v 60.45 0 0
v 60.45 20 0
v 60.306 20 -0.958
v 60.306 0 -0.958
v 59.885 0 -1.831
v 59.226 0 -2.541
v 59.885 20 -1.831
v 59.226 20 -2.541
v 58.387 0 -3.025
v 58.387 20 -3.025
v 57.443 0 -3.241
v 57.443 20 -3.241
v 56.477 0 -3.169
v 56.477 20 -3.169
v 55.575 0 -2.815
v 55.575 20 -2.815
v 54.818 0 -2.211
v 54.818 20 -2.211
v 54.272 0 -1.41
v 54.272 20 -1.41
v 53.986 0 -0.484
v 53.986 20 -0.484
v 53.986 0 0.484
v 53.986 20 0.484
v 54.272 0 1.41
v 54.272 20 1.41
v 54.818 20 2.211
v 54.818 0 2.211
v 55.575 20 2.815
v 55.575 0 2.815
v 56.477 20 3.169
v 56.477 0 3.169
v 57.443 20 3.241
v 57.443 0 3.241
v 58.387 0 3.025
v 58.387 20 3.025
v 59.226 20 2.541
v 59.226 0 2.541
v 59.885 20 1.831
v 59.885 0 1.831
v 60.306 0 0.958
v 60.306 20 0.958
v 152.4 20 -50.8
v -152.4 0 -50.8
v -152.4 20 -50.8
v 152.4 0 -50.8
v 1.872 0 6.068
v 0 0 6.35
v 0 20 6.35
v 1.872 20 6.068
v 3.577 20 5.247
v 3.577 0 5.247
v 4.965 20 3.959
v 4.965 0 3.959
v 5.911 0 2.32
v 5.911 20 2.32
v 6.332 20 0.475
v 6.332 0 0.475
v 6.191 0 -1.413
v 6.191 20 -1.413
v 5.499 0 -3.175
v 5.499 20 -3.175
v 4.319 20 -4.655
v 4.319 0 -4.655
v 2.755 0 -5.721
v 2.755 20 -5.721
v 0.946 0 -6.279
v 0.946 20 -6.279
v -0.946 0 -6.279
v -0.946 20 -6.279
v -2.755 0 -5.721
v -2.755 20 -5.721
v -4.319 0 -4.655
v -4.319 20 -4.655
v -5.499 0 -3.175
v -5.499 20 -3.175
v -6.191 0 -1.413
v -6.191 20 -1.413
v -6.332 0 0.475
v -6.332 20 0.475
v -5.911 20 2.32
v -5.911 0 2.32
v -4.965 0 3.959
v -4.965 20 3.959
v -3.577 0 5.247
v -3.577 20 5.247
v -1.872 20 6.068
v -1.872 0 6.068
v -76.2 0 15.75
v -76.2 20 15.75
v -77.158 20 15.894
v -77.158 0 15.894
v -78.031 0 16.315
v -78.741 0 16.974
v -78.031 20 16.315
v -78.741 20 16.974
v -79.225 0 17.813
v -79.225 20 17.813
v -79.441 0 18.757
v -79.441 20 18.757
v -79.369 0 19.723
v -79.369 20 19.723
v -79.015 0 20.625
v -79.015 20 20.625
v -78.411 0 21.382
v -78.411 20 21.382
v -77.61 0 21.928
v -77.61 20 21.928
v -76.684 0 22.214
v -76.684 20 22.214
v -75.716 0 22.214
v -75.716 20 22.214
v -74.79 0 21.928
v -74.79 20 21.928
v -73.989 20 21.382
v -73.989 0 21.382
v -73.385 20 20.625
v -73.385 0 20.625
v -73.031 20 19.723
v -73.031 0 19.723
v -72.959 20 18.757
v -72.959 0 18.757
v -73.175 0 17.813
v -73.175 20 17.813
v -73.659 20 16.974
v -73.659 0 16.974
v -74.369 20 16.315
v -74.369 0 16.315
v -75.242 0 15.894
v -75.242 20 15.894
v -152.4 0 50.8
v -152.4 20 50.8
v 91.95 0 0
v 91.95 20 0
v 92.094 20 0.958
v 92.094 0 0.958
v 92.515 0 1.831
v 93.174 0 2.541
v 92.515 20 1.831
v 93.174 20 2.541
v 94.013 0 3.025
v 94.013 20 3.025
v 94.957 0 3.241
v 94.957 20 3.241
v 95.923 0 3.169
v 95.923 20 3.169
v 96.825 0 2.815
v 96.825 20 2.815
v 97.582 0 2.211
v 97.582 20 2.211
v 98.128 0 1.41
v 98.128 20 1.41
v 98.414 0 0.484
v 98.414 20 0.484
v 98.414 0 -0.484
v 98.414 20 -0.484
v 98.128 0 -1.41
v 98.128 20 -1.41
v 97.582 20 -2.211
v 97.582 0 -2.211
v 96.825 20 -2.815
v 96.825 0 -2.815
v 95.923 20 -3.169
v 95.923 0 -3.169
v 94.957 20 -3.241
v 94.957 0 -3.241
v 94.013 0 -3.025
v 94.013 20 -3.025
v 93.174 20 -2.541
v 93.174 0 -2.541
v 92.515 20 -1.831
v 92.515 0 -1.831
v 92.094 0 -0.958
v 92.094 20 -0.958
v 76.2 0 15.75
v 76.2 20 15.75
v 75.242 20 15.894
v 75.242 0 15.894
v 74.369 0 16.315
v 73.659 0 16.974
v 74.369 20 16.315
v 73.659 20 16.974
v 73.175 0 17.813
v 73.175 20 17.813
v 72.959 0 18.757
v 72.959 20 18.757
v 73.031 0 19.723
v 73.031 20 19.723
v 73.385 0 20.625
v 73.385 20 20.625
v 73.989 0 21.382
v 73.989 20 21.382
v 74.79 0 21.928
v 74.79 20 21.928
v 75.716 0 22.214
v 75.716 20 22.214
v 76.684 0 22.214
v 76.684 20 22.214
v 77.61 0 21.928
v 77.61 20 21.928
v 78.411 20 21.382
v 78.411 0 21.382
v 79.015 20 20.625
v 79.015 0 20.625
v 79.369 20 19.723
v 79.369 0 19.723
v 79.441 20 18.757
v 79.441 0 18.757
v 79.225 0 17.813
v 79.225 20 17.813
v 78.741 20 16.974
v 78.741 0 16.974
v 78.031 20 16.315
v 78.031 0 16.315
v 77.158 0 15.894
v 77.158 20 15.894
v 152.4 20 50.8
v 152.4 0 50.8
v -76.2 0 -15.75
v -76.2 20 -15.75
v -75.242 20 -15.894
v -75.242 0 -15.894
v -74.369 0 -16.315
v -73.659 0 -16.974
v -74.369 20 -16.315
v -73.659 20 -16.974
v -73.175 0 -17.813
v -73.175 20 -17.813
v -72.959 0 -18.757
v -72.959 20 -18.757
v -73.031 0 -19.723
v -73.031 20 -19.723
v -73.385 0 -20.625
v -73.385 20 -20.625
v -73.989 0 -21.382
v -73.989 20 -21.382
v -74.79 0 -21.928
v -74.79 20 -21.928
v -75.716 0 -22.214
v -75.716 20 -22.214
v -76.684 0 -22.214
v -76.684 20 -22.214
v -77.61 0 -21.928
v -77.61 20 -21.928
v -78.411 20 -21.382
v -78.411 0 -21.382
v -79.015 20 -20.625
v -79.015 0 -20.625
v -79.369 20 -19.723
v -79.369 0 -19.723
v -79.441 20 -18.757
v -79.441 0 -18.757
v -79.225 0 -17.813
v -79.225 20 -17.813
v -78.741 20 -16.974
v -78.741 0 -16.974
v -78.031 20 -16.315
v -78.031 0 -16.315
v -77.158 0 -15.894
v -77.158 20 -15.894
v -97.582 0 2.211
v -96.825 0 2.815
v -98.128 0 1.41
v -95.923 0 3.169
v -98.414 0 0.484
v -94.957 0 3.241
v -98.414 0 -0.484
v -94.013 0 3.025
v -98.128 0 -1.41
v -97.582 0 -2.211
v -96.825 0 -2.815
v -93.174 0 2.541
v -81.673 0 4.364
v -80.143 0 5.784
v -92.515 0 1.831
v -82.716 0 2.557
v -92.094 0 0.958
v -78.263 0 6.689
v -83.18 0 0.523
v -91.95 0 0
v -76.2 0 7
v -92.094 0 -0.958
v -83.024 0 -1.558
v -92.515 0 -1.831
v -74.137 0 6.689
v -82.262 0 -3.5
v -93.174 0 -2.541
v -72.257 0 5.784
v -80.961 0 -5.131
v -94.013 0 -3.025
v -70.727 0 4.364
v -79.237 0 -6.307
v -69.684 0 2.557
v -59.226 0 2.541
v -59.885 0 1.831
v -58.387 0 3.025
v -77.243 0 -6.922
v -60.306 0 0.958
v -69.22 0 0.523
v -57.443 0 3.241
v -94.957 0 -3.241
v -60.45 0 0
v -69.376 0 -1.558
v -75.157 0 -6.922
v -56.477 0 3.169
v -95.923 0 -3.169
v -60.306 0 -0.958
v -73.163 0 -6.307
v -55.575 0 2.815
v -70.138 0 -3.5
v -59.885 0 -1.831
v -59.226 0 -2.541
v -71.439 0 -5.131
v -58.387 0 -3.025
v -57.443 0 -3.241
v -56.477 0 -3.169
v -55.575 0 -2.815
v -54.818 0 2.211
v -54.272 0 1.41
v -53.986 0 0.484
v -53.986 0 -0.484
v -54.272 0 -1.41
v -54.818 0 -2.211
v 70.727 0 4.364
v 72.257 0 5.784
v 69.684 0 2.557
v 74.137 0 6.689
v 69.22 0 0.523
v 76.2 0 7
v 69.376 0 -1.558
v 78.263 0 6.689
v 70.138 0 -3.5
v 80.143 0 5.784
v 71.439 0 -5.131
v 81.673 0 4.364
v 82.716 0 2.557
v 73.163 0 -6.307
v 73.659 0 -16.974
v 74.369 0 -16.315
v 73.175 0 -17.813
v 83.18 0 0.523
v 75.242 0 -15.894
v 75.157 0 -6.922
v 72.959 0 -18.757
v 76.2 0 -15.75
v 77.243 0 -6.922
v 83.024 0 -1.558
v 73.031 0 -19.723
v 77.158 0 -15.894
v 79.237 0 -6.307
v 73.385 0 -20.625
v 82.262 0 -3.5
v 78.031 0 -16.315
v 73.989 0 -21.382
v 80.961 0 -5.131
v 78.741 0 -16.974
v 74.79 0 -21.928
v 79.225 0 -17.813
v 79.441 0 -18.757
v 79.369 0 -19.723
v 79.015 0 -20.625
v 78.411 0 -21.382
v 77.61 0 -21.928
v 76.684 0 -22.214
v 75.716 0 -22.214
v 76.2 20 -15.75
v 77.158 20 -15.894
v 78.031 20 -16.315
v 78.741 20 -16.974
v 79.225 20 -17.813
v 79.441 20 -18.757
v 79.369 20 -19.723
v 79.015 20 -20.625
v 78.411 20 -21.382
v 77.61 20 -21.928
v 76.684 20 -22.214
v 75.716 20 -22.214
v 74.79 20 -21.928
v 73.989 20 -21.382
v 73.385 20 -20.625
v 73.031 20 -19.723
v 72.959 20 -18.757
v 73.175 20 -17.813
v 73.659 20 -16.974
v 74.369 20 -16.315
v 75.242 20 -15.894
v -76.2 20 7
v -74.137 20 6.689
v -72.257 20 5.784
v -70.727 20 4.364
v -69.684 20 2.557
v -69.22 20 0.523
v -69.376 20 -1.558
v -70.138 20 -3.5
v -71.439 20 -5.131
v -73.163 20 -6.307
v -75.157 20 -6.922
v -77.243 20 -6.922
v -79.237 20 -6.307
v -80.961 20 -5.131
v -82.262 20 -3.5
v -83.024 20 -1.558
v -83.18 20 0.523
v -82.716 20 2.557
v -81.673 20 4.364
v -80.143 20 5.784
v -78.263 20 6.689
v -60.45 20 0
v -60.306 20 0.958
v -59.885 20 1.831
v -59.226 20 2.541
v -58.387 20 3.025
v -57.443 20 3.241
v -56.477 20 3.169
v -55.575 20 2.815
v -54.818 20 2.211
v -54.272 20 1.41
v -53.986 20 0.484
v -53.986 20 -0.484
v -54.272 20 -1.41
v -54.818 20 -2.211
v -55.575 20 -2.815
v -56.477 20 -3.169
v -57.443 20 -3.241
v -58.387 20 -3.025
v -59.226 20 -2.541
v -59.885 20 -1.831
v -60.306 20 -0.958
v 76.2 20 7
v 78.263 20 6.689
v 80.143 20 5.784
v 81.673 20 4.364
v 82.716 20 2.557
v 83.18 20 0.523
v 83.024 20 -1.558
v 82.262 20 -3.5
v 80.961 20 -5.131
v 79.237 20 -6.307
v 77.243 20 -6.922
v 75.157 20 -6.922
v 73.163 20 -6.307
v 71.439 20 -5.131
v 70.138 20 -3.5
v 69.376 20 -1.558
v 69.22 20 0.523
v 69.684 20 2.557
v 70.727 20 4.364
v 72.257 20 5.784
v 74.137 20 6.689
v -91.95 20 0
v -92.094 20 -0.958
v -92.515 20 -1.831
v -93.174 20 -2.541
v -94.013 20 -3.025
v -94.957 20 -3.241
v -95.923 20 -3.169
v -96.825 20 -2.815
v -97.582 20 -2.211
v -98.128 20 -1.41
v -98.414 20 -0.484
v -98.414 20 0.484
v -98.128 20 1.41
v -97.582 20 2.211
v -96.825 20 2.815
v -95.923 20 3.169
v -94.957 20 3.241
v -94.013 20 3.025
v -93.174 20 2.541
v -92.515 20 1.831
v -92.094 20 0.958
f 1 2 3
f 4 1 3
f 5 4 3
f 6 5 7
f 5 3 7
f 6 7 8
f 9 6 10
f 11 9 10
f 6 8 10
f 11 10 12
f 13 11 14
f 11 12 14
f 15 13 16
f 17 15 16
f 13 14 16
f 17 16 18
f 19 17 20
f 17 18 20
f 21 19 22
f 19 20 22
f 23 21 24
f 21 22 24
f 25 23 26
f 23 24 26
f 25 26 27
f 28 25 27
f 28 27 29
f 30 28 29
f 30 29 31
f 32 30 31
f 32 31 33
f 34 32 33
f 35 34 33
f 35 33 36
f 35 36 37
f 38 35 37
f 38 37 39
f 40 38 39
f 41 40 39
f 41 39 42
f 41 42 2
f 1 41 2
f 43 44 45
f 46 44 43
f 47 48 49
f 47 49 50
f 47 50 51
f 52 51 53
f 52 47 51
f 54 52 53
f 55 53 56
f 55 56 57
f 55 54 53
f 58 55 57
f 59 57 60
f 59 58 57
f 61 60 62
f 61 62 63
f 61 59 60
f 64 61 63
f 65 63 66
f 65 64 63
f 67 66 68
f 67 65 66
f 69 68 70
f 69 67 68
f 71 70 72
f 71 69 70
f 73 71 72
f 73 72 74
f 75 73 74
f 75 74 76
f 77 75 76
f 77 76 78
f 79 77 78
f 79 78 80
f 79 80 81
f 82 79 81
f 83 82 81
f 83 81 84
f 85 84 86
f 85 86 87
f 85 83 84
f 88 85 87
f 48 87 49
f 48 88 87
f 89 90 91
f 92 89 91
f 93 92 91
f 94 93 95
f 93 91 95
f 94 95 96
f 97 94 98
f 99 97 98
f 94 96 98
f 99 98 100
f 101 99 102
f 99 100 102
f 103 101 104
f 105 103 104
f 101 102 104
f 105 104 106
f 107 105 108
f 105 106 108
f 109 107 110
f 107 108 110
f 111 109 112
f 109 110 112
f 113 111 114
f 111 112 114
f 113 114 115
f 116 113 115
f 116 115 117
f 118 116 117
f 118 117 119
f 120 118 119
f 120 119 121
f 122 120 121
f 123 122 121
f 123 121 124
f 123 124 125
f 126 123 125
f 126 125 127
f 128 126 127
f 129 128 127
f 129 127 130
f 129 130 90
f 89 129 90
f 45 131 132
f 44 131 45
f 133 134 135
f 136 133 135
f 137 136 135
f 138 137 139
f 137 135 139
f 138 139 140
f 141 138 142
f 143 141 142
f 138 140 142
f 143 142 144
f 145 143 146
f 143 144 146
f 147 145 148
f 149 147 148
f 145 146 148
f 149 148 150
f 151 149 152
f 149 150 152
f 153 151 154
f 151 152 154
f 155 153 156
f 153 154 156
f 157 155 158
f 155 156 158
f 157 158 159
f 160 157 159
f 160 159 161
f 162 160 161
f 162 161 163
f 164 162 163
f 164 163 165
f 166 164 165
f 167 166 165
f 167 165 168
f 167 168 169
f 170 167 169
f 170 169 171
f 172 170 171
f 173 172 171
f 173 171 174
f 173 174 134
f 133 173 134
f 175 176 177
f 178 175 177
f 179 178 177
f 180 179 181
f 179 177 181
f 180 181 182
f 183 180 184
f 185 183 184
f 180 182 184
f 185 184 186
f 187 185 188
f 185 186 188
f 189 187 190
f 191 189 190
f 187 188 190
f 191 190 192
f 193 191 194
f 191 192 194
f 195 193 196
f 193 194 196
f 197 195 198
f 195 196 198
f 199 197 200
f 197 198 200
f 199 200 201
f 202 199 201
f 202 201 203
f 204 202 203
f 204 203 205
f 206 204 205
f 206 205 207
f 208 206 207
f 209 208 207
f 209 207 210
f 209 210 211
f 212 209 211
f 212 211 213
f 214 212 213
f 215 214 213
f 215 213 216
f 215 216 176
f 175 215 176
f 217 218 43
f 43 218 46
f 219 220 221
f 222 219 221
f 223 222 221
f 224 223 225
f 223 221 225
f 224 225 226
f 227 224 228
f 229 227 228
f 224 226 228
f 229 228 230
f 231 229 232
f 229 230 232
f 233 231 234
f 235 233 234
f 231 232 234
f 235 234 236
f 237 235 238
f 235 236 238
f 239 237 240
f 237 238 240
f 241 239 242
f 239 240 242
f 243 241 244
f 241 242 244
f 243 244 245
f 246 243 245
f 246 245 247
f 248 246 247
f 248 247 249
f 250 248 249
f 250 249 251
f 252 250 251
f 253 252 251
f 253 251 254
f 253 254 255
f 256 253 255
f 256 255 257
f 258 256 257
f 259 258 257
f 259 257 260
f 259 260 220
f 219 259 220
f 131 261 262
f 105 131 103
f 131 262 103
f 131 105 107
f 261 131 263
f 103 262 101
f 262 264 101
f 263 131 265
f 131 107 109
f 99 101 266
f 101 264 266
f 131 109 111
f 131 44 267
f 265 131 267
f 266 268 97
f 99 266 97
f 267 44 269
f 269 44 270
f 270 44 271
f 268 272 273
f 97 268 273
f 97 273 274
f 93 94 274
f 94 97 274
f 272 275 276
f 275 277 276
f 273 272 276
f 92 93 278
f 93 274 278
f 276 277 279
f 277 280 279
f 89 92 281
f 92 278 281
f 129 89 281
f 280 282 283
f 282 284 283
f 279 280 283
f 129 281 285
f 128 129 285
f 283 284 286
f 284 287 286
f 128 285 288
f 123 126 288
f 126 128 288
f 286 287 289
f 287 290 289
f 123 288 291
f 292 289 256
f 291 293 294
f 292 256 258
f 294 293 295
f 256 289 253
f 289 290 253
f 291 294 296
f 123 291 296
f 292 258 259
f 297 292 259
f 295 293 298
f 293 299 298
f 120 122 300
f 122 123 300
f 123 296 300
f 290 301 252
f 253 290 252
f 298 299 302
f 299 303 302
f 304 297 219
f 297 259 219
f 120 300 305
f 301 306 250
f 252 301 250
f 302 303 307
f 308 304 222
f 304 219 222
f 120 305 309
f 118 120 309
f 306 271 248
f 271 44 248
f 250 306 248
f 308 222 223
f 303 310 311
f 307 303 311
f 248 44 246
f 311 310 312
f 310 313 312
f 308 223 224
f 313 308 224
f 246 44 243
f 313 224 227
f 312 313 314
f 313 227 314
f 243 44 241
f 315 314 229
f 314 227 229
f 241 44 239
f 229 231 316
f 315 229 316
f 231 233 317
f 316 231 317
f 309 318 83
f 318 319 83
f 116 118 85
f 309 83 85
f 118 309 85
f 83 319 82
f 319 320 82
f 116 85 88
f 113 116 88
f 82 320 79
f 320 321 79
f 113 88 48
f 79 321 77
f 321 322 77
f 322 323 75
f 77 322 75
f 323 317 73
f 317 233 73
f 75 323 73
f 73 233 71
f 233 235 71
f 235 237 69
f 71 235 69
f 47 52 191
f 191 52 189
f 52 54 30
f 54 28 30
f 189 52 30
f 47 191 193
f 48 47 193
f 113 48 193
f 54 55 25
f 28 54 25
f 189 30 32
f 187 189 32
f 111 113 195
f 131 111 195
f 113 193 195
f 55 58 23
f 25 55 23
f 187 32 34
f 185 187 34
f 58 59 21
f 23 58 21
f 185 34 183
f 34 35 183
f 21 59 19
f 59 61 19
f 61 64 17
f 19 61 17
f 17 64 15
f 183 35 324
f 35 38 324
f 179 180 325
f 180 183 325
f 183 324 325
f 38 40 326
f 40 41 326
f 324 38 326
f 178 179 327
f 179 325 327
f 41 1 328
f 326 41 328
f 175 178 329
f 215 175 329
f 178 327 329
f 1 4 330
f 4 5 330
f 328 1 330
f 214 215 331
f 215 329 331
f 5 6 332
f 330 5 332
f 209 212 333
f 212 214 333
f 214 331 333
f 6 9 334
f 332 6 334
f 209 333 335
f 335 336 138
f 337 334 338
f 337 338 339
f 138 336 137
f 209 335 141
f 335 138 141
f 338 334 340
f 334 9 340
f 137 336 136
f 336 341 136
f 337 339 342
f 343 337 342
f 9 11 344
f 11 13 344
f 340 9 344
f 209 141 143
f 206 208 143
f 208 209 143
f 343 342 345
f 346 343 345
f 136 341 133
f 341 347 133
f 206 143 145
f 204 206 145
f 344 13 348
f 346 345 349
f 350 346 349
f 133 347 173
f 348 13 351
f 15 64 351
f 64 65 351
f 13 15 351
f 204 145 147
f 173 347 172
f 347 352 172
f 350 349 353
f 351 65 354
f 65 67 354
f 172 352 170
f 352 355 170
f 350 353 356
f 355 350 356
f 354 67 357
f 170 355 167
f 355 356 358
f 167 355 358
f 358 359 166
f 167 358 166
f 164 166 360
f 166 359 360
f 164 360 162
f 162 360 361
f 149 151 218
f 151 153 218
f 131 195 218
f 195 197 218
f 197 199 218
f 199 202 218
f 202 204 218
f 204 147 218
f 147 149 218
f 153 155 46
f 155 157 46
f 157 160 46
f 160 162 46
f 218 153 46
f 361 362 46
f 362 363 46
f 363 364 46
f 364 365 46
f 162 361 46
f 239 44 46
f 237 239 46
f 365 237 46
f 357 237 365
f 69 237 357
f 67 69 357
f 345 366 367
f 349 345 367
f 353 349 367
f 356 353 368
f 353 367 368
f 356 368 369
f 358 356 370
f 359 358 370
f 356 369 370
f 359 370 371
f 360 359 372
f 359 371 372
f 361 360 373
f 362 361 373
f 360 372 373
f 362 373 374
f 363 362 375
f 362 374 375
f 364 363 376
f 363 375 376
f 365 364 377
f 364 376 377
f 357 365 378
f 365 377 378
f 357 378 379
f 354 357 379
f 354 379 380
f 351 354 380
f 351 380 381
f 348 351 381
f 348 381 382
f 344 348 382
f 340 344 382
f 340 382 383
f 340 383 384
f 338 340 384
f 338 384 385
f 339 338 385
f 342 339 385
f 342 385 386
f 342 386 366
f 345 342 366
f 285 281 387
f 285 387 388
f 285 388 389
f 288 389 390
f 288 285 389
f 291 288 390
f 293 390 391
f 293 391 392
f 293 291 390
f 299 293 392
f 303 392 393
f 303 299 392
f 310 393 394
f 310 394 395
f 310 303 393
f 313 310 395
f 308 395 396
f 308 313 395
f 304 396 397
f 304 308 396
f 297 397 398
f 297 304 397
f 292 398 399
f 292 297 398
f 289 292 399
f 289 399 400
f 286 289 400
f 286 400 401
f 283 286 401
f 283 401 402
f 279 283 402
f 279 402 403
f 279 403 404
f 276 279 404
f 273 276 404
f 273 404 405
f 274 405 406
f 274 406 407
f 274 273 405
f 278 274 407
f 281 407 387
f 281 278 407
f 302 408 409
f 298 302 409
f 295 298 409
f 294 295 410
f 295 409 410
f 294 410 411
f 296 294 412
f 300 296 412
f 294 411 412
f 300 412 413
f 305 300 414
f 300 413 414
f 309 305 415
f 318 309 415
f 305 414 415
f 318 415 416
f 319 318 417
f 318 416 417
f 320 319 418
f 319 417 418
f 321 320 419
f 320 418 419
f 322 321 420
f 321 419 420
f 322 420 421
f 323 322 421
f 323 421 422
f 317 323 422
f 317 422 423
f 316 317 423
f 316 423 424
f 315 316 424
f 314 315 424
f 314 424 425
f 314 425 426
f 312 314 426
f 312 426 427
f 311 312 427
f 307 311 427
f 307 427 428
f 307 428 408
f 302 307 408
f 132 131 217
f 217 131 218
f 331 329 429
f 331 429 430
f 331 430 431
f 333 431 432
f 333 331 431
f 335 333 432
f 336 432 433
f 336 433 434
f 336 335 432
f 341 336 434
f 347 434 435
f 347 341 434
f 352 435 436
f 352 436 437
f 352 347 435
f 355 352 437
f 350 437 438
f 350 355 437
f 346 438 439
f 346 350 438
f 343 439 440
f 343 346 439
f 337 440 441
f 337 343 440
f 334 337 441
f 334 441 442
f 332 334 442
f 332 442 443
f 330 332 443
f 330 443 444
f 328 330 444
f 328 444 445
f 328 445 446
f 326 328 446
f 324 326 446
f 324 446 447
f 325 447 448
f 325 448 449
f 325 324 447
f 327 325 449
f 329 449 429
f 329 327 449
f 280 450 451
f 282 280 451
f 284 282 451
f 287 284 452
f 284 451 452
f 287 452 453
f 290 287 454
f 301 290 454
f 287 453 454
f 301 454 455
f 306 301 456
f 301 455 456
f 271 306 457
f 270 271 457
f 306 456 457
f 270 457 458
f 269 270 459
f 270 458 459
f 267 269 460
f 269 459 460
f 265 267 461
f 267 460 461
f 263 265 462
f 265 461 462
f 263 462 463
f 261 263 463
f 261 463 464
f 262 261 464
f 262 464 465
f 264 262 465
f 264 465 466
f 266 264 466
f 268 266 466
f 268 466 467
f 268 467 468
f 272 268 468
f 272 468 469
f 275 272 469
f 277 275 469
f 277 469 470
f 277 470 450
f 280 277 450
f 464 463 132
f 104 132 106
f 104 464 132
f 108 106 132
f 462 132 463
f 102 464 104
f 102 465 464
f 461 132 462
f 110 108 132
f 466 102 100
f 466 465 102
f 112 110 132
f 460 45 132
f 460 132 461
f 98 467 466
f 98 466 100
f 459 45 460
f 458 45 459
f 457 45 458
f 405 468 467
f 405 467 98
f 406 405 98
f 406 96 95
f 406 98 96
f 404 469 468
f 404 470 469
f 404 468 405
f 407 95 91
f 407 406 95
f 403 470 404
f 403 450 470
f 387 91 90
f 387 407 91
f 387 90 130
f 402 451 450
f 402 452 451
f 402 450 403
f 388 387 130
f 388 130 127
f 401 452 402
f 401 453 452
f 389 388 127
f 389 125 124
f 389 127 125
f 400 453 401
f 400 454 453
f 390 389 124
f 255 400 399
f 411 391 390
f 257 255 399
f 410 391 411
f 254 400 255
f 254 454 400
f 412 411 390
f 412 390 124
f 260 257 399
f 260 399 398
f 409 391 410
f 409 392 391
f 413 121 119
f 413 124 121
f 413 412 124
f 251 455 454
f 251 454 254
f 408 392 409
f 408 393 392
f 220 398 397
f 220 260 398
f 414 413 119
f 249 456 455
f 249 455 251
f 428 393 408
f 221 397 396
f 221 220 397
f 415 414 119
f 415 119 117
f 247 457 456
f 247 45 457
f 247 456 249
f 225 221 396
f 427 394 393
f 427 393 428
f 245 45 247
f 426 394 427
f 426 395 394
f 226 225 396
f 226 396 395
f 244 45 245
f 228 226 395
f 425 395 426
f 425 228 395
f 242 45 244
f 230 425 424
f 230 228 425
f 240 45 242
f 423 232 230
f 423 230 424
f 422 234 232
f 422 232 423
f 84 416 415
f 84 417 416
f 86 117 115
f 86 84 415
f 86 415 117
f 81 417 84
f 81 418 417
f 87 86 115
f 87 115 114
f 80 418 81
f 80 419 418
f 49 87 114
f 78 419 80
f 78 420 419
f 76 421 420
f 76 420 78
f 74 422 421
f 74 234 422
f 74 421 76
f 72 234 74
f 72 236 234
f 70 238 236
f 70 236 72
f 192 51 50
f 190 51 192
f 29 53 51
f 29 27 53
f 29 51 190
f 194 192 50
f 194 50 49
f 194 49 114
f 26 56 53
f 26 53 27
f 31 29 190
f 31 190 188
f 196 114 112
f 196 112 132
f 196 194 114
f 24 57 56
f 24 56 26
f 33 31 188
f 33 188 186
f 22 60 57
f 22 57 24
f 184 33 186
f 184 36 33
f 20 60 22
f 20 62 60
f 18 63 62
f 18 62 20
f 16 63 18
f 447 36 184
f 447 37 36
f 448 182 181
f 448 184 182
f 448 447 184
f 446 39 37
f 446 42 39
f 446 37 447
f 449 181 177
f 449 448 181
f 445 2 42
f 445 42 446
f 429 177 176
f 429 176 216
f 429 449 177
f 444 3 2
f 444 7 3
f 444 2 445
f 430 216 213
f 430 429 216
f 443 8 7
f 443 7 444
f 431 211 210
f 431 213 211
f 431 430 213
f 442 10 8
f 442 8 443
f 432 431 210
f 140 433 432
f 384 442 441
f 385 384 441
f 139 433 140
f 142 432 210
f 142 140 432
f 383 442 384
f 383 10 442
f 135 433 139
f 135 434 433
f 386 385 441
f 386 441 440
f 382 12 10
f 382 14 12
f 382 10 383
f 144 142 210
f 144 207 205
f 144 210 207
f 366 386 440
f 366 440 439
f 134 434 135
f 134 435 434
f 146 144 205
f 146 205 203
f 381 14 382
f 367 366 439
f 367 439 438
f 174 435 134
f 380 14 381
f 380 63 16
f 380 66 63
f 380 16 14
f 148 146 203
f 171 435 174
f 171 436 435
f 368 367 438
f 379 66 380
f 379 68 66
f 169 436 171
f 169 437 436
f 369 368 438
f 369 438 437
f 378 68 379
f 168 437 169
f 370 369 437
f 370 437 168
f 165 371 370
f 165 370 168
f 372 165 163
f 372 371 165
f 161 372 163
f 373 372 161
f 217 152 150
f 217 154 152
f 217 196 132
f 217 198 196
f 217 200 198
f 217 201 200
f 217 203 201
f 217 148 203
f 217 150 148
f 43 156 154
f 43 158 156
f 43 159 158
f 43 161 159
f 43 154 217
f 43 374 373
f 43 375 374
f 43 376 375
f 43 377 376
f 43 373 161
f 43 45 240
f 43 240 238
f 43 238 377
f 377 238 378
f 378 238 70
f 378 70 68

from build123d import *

# Parameters (mm, degrees)
SKETCH2_W                 = 304.8
SKETCH2_H                 = 101.6
SKETCH2_R                 = 6.35
SKETCH2_R_2               = 7
BOSS_EXTRUDE1_DEPTH       = 20
SKETCH3_R                 = 3.25
CUT_EXTRUDE1_DEPTH        = 162.883909021
CIRPATTERN1_COUNT         = 4
LPATTERN1_COUNT           = 2
LPATTERN1_PITCH           = 152.4
LPATTERN1_COPY_1_SKETCH_R = 3.25
LPATTERN1_COPY_1_DEPTH    = 162.883909021
LPATTERN1_COPY_2_SKETCH_R = 3.25
LPATTERN1_COPY_2_DEPTH    = 162.883909021
LPATTERN1_COPY_3_SKETCH_R = 3.25
LPATTERN1_COPY_3_DEPTH    = 162.883909021


with BuildPart() as part:
    # Sketch2 → Boss-Extrude1 (new body)
    with BuildSketch(Plane(origin=(0, 0, 0), x_dir=(1, 0, 0), z_dir=(0, 1, 0))):
        Rectangle(SKETCH2_W, SKETCH2_H)
        with Locations(Location((0, 0, 0), (0, 0, 270))):
            Circle(SKETCH2_R, mode=Mode.SUBTRACT)
        with Locations(Location((-76.2, 0, 0), (0, 0, 270))):
            Circle(SKETCH2_R_2, mode=Mode.SUBTRACT)
        with Locations(Location((76.2, 0, 0), (0, 0, 270))):
            Circle(SKETCH2_R_2, mode=Mode.SUBTRACT)
    extrude(amount=BOSS_EXTRUDE1_DEPTH)

    # Sketch3 → Cut-Extrude1 (cut, through all)
    with BuildSketch(Plane(origin=(0, 20, 0), x_dir=(1, 0, 0), z_dir=(0, 1, 0))):
        with Locations(Location((-76.2, 19, 0), (0, 0, 270))):
            Circle(SKETCH3_R)
    cut_extrude1 = extrude(amount=-CUT_EXTRUDE1_DEPTH, mode=Mode.SUBTRACT)

    # CirPattern1: Cut-Extrude1 ×4 about axis
    cirpattern1_axis = Axis((-76.2, 0, 0), (0, 1, 0))
    for i in range(1, CIRPATTERN1_COUNT):
        add(cut_extrude1.rotate(cirpattern1_axis, i * 360 / CIRPATTERN1_COUNT), mode=Mode.SUBTRACT)

    # LPattern1: Cut-Extrude1 ×2
    with Locations(*[(i * LPATTERN1_PITCH, 0, 0) for i in range(1, LPATTERN1_COUNT)]):
        add(cut_extrude1, mode=Mode.SUBTRACT)

    # LPattern1 copy 1 sketch → LPattern1 copy 1 (cut, through all)
    with BuildSketch(Plane(origin=(76.2, 20, -76.2), x_dir=(0, 0, -1), z_dir=(0, 1, 0))):
        with Locations(Location((-76.2, 19, 0), (0, 0, 270))):
            Circle(LPATTERN1_COPY_1_SKETCH_R)
    extrude(amount=-LPATTERN1_COPY_1_DEPTH, mode=Mode.SUBTRACT)

    # LPattern1 copy 2 sketch → LPattern1 copy 2 (cut, through all)
    with BuildSketch(Plane(origin=(0, 20, 0), x_dir=(-1, 0, 0), z_dir=(0, 1, 0))):
        with Locations(Location((-76.2, 19, 0), (0, 0, 270))):
            Circle(LPATTERN1_COPY_2_SKETCH_R)
    extrude(amount=-LPATTERN1_COPY_2_DEPTH, mode=Mode.SUBTRACT)

    # LPattern1 copy 3 sketch → LPattern1 copy 3 (cut, through all)
    with BuildSketch(Plane(origin=(76.2, 20, 76.2), x_dir=(0, 0, 1), z_dir=(0, 1, 0))):
        with Locations(Location((-76.2, 19, 0), (0, 0, 270))):
            Circle(LPATTERN1_COPY_3_SKETCH_R)
    extrude(amount=-LPATTERN1_COPY_3_DEPTH, mode=Mode.SUBTRACT)


solid = part.part
